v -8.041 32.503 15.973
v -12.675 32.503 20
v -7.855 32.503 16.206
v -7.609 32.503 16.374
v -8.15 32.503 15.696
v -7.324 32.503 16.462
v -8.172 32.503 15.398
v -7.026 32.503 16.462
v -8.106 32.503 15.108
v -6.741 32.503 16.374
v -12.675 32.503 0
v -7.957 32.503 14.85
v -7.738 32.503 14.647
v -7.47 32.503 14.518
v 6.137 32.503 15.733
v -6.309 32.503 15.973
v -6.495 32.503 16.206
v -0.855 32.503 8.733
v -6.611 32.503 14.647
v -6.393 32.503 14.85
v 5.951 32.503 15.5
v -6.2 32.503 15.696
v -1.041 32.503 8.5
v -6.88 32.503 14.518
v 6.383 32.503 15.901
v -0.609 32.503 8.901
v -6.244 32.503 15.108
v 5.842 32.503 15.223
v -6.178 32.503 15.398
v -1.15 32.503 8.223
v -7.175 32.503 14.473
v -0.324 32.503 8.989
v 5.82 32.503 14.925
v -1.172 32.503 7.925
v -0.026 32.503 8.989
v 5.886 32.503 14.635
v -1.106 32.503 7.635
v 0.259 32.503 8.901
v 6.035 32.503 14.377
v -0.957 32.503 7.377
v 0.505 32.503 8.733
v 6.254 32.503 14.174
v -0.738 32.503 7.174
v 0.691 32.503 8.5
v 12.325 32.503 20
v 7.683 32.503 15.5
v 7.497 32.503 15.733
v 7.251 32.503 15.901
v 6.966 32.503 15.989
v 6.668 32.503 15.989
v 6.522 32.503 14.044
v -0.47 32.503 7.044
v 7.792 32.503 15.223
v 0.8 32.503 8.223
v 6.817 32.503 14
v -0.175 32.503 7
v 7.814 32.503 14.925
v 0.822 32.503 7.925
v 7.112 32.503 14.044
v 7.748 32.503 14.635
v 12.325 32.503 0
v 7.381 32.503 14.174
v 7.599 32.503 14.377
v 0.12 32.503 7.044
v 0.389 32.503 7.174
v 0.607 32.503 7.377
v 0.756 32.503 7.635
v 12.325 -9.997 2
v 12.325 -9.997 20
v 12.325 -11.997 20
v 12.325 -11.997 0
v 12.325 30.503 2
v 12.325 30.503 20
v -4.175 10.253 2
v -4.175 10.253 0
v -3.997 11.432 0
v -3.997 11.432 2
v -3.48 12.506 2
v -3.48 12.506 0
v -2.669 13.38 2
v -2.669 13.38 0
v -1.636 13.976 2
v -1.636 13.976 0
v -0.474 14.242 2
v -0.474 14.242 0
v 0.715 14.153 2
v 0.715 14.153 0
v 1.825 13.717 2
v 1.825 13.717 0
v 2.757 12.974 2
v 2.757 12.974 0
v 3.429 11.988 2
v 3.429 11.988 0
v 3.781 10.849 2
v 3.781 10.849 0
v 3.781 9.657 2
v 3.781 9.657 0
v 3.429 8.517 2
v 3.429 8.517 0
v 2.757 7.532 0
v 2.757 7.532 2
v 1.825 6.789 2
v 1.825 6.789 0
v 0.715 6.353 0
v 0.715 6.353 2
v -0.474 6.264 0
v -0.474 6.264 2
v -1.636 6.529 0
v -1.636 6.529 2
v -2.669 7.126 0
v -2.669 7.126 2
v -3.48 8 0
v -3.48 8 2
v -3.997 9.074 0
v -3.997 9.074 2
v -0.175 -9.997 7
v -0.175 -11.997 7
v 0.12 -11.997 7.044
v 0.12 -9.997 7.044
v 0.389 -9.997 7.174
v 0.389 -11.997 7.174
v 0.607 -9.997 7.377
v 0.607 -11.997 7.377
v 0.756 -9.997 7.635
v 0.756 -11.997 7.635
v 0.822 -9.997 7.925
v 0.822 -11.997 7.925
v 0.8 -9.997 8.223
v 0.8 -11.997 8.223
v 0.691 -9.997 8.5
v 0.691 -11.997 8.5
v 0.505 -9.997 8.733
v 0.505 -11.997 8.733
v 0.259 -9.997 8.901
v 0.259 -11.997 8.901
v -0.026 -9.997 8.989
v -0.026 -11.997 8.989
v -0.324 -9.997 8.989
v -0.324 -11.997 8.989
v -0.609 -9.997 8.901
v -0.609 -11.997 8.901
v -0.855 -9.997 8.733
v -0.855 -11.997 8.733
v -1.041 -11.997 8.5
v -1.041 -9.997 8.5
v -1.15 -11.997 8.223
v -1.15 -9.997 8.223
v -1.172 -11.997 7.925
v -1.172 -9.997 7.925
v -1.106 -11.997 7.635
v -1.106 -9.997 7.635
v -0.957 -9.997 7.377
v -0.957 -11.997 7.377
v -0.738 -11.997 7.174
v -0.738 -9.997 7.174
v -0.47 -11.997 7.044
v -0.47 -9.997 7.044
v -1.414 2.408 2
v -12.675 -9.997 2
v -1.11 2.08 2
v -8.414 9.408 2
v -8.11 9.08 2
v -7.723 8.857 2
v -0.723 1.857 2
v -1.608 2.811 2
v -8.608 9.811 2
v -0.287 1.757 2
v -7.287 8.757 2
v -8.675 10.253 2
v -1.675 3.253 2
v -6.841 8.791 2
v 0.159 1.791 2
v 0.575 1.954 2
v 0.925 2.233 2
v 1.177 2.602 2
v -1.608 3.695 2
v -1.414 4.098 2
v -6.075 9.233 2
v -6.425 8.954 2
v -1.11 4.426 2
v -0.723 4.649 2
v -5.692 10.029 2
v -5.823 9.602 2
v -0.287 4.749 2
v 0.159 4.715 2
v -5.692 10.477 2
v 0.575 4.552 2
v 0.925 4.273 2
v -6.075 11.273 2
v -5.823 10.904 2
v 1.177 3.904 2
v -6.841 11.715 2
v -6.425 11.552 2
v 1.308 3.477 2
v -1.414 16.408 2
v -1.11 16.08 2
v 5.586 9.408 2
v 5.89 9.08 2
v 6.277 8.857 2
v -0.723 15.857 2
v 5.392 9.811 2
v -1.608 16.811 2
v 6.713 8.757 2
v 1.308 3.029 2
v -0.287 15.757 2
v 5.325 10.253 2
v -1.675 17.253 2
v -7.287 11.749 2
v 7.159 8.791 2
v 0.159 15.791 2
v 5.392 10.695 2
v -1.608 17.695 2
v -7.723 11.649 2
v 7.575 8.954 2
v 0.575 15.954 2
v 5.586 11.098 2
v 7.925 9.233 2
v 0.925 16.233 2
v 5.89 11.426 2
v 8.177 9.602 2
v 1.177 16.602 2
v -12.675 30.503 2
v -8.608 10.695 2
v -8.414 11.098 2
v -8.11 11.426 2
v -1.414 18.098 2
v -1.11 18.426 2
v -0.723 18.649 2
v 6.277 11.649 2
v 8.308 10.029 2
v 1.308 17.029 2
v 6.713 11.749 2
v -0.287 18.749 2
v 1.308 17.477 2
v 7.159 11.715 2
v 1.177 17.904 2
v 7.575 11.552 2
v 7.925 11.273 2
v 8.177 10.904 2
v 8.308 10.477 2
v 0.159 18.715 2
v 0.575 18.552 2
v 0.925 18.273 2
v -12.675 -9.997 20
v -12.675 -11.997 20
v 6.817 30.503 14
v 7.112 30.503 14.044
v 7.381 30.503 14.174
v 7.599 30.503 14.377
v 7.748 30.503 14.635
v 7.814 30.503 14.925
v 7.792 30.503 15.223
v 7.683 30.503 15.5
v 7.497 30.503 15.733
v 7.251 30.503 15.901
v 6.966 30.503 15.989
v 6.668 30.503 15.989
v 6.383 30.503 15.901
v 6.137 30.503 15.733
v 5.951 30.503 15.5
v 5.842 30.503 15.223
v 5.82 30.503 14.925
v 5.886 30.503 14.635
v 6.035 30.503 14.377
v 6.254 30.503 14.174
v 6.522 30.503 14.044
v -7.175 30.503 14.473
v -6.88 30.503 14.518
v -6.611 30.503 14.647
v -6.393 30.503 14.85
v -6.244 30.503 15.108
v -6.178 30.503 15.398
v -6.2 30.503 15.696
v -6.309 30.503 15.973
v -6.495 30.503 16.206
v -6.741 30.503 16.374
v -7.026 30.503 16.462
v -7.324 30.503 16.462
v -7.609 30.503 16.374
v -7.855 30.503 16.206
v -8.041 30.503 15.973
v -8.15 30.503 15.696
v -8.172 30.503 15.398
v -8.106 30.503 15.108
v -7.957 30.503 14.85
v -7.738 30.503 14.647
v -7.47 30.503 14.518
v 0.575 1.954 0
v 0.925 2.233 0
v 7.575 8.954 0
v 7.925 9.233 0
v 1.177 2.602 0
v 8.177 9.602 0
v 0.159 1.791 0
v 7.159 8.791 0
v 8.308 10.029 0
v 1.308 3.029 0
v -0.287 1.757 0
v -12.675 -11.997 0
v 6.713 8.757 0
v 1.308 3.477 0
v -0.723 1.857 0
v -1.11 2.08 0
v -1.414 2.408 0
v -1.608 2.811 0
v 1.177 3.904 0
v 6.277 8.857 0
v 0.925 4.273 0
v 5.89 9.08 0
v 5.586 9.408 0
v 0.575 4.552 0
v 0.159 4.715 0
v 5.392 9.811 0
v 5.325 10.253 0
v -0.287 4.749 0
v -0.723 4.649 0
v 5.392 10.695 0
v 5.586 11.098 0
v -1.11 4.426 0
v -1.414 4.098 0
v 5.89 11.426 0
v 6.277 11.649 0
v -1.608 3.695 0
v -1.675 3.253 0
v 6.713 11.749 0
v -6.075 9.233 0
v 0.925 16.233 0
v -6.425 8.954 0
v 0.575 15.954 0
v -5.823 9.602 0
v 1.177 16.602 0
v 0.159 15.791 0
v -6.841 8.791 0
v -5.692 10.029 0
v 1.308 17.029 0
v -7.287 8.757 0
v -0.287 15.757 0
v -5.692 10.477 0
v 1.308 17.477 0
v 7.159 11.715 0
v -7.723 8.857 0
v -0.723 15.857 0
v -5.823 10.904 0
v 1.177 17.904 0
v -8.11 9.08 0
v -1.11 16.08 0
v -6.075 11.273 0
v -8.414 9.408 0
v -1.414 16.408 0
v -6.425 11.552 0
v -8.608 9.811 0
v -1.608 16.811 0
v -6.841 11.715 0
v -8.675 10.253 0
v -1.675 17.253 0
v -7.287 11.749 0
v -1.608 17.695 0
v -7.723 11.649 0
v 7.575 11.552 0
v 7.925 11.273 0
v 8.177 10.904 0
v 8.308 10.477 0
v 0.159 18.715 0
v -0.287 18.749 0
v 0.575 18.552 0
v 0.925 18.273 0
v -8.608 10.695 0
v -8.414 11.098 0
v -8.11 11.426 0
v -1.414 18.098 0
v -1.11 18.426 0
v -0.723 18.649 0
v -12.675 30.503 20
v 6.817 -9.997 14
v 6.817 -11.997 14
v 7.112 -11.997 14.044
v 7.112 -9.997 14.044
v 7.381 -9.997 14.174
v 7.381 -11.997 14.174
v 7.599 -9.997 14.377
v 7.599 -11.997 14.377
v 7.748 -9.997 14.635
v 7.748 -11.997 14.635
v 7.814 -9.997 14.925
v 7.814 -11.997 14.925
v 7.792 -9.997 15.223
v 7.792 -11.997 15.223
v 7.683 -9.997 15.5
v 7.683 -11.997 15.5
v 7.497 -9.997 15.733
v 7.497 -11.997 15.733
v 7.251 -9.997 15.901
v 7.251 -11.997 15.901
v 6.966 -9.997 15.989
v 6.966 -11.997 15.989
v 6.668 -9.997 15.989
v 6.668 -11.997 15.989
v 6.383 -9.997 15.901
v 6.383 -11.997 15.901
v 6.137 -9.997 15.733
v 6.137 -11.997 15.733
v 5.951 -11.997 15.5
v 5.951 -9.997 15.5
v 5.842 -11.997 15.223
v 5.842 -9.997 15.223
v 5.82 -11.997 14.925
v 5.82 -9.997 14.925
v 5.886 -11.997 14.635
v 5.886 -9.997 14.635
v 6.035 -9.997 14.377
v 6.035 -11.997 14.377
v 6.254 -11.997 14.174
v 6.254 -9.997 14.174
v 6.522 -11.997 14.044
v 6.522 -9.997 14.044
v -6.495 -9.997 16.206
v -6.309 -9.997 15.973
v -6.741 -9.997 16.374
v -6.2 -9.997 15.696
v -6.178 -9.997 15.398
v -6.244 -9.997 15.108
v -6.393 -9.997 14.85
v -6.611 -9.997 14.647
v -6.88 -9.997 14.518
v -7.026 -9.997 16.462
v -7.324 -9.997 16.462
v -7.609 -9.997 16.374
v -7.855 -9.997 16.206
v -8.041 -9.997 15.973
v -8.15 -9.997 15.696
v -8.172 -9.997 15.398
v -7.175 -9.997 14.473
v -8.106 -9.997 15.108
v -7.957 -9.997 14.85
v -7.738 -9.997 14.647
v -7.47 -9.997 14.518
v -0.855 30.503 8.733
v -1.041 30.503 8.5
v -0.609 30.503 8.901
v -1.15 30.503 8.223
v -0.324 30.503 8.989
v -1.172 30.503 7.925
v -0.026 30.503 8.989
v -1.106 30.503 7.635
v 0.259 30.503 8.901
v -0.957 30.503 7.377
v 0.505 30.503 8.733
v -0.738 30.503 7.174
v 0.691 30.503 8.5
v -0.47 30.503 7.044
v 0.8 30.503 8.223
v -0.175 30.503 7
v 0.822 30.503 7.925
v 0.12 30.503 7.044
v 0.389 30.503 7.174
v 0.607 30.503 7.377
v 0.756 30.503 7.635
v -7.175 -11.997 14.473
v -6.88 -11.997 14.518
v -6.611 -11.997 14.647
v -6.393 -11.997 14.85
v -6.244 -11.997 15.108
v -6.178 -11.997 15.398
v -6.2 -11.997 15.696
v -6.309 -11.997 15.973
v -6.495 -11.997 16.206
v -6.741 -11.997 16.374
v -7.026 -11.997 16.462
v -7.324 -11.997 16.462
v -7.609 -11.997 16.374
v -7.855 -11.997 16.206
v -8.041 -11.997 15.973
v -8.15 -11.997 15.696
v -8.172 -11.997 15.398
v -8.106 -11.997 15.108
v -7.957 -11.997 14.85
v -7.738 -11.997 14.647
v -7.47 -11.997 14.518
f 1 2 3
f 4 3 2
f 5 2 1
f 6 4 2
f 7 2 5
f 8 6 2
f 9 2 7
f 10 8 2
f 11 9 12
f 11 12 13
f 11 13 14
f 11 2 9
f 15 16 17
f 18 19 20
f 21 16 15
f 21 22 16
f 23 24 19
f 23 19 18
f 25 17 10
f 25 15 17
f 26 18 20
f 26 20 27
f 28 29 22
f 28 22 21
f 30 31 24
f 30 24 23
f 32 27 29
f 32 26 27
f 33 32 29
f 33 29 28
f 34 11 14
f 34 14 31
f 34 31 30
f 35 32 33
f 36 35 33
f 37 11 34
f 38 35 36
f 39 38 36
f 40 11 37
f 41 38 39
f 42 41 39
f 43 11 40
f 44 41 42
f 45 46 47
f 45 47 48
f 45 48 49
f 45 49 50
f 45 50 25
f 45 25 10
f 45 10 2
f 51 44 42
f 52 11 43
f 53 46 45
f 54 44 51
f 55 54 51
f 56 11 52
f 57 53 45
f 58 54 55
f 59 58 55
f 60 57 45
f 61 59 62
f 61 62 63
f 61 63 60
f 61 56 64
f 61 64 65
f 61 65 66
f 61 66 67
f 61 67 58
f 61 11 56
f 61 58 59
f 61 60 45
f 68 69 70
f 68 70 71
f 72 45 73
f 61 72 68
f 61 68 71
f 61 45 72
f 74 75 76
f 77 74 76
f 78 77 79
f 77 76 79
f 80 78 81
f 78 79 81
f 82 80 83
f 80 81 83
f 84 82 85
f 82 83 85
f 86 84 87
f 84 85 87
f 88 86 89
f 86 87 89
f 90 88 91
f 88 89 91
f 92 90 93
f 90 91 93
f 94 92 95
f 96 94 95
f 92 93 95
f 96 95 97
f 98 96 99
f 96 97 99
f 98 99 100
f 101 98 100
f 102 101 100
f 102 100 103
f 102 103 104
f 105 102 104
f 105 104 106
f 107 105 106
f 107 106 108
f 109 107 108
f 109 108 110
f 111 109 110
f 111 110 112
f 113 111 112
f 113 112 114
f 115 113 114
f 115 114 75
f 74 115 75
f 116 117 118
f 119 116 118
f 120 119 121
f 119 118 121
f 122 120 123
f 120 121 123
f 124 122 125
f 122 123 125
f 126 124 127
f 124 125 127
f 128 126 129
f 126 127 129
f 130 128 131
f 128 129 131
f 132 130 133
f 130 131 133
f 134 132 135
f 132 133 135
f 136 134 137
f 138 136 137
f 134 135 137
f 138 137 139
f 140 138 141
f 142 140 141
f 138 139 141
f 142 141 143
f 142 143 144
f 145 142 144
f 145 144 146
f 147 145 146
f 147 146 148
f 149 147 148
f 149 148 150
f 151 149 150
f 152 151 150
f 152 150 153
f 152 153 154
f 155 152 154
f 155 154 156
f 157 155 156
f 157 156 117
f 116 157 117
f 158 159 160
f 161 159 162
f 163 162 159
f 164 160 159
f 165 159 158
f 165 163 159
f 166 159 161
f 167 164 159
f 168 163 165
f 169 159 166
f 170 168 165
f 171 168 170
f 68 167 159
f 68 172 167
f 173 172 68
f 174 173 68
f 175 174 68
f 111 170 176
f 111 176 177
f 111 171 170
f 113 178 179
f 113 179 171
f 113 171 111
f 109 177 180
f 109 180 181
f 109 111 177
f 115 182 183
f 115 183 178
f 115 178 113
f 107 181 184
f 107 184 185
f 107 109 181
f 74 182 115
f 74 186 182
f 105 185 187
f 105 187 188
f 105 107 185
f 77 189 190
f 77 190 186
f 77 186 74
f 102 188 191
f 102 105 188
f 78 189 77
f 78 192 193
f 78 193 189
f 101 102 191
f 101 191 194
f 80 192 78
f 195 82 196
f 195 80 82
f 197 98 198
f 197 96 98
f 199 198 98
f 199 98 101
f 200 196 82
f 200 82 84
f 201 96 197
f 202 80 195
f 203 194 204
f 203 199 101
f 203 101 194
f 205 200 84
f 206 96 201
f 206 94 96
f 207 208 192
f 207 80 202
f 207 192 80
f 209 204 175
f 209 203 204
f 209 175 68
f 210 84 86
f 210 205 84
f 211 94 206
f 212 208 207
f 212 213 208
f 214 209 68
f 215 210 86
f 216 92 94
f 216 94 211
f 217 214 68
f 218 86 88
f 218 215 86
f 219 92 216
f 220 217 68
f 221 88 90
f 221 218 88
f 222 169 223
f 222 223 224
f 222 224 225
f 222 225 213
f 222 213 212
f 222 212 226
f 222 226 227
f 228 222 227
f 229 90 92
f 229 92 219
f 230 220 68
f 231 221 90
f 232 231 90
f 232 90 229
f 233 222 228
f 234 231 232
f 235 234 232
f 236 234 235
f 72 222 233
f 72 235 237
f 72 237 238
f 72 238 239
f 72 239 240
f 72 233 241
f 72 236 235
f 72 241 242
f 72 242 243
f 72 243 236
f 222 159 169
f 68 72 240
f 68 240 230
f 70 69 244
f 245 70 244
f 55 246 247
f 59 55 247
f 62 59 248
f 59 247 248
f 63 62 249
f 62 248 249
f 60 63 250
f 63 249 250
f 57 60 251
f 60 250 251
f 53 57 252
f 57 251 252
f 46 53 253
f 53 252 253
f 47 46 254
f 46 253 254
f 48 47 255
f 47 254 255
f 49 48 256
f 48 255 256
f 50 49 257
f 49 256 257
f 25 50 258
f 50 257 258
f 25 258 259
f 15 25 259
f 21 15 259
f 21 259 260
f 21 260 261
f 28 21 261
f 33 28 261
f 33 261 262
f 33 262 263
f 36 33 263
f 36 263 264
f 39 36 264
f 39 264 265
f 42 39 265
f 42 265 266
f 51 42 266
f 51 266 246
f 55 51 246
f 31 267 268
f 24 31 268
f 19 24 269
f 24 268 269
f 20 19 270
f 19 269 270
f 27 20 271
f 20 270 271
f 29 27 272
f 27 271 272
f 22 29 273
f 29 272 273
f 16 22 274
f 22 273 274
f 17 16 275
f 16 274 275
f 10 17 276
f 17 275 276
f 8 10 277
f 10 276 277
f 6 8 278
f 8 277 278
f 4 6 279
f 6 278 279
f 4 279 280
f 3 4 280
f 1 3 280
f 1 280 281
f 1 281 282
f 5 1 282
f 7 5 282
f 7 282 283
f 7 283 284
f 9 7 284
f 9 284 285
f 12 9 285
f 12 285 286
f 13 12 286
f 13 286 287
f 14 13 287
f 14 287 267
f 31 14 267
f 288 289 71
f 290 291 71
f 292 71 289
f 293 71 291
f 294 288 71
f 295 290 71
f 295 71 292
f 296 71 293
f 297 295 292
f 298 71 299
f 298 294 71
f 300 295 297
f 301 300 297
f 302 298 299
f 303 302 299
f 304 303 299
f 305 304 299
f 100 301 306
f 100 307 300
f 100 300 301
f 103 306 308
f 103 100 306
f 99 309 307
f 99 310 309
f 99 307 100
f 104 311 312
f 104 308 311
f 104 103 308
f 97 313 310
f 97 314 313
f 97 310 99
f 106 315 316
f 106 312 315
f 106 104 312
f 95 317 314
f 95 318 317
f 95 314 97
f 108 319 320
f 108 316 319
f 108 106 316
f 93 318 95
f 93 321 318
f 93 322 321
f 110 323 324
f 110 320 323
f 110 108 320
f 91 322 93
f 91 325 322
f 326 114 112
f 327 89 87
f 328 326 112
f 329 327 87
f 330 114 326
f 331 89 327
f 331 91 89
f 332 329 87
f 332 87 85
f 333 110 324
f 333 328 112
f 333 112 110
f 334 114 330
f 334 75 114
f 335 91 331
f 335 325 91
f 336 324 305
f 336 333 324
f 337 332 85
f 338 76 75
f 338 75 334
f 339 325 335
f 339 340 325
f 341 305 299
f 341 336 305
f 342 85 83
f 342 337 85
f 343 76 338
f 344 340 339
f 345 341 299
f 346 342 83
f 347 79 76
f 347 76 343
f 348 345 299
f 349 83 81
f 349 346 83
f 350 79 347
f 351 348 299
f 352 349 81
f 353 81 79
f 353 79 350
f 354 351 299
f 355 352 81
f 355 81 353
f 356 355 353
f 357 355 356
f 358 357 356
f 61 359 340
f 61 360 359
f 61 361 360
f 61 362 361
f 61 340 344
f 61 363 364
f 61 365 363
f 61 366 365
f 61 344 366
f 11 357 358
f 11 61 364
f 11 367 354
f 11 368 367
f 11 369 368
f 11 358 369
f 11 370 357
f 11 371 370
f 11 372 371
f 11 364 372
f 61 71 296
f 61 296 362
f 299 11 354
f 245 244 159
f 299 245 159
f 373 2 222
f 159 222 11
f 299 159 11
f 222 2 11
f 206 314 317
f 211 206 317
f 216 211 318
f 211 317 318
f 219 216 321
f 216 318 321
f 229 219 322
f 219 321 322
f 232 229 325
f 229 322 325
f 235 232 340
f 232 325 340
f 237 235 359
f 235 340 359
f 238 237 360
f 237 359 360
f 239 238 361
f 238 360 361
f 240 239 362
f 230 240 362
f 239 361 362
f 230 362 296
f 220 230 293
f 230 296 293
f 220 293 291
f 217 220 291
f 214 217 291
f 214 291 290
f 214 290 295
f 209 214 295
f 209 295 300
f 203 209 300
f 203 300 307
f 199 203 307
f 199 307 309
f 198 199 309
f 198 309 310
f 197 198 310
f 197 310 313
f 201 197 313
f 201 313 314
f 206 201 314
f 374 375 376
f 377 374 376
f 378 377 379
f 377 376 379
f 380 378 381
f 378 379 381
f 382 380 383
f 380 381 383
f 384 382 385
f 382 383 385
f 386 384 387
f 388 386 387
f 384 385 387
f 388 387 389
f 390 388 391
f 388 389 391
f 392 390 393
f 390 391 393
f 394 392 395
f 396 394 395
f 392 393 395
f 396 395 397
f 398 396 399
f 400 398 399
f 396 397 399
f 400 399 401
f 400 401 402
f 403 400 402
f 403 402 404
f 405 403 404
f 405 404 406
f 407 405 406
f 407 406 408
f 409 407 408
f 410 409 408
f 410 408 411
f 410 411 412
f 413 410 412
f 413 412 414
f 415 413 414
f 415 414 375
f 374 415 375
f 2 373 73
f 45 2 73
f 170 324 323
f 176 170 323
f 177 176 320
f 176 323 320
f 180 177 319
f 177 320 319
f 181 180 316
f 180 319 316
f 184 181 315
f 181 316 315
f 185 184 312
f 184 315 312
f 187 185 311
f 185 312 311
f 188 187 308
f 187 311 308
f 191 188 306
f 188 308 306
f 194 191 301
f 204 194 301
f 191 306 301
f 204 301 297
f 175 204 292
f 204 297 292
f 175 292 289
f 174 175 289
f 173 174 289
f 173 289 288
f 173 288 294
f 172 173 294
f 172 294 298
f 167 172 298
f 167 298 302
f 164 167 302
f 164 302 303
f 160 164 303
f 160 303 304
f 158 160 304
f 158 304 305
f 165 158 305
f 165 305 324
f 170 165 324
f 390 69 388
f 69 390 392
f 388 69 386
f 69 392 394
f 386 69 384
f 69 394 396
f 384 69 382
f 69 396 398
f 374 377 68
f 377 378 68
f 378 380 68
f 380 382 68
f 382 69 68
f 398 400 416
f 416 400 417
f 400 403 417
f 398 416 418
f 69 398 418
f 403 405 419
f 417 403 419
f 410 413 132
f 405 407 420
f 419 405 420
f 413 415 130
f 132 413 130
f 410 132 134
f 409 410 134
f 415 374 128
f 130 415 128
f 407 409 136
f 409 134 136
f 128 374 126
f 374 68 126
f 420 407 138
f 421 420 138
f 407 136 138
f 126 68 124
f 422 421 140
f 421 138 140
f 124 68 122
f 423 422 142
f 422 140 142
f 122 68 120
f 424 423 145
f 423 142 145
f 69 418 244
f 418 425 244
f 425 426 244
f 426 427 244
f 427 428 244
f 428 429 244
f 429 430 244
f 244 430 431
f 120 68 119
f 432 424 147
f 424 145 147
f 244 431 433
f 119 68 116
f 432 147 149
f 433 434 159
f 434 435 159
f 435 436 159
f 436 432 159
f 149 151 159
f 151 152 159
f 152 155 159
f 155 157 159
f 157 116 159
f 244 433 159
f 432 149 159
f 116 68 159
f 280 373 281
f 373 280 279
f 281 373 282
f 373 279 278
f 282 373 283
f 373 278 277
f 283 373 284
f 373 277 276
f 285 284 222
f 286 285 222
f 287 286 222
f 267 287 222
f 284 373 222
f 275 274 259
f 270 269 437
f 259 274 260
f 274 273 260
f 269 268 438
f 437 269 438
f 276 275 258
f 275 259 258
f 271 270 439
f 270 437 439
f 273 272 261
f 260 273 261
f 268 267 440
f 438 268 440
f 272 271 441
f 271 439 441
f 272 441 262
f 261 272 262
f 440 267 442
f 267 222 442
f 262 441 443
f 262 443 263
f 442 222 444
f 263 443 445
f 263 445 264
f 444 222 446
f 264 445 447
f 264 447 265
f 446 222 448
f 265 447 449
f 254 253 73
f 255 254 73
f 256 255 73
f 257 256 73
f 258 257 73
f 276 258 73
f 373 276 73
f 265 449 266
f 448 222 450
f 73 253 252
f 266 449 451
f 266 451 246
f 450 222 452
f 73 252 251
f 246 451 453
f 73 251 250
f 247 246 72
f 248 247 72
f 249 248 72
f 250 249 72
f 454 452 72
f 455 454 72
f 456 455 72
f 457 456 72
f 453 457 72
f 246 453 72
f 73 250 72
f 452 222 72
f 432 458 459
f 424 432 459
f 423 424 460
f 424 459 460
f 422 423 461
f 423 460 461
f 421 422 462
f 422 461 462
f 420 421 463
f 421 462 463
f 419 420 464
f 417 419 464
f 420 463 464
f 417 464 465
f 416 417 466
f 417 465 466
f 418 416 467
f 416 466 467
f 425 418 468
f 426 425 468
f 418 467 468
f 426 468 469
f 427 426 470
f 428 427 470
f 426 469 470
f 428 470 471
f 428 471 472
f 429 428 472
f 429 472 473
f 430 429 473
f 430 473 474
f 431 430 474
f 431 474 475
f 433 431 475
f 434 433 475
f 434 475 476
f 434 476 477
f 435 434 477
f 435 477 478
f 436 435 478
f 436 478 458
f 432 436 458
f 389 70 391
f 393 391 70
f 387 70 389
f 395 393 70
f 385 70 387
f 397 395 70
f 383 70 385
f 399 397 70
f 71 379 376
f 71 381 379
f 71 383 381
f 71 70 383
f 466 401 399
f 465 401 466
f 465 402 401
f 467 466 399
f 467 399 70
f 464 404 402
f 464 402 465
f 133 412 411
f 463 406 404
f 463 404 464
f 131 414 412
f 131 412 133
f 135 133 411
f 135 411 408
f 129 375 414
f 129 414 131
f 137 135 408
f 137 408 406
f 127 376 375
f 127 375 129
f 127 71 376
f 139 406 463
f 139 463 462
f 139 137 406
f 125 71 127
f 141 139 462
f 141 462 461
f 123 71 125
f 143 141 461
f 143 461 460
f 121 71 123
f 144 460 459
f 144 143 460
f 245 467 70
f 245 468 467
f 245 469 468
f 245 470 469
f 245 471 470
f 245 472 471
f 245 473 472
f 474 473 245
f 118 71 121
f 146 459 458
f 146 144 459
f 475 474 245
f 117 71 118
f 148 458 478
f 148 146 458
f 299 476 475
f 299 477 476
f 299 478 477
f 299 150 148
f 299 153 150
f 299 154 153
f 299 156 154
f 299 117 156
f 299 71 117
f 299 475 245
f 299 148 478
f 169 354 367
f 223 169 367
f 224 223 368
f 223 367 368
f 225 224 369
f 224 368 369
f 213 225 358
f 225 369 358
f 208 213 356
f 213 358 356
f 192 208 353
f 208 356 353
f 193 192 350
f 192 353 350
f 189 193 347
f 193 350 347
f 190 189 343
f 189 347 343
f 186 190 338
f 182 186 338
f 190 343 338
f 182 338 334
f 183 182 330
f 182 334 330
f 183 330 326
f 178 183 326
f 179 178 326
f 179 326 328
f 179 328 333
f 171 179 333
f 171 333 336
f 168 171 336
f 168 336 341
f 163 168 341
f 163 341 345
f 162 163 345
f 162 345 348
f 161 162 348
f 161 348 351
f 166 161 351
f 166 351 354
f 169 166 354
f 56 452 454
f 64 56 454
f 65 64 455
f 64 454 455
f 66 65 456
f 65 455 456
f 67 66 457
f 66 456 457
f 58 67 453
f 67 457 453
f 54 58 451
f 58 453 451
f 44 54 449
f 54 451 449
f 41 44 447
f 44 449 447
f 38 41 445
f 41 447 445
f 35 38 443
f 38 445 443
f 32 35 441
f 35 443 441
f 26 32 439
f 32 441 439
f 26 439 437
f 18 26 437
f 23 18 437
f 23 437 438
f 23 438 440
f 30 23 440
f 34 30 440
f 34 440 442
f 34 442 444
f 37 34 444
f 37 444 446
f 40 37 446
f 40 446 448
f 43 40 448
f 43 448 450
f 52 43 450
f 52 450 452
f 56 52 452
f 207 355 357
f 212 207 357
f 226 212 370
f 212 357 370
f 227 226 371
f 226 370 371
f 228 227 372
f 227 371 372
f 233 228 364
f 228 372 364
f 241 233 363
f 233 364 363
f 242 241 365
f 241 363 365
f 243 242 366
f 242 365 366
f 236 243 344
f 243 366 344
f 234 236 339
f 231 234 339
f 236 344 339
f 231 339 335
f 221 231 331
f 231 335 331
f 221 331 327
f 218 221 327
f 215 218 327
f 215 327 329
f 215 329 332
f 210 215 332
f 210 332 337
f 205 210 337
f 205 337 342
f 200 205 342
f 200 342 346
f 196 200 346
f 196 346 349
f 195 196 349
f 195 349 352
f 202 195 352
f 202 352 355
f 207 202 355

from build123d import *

# Parameters (mm, degrees)
SKETCH1_W           = 25
SKETCH1_H           = 40.5
BOSS_EXTRUDE1_DEPTH = 2
SKETCH2_W           = 25
SKETCH2_H           = 20
BOSS_EXTRUDE2_DEPTH = 2
SKETCH3_W           = 25
SKETCH3_H           = 20
BOSS_EXTRUDE3_DEPTH = 2
SKETCH5_R           = 4
CUT_EXTRUDE2_DEPTH  = 21
SKETCH6_R           = 1.5
CUT_EXTRUDE3_DEPTH  = 21
SKETCH7_R           = 1
CUT_EXTRUDE4_DEPTH  = 55


with BuildPart() as part:
    # Sketch1 → Boss-Extrude1 (new body)
    with BuildSketch(Plane.XY):
        with Locations((-0.174770451, 10.252942624)):
            Rectangle(SKETCH1_W, SKETCH1_H)
    extrude(amount=BOSS_EXTRUDE1_DEPTH)

    # Sketch2 → Boss-Extrude2 (add)
    with BuildSketch(Plane(origin=(0, 30.502942624, 0), x_dir=(1, 0, 0), z_dir=(0, 1, 0))):
        with Locations((-0.174770451, -10)):
            Rectangle(SKETCH2_W, SKETCH2_H)
    extrude(amount=BOSS_EXTRUDE2_DEPTH)

    # Sketch3 → Boss-Extrude3 (add)
    with BuildSketch(Plane(origin=(0, -9.997057376, 0), x_dir=(-1, 0, 0), z_dir=(0, -1, 0))):
        with Locations((0.174770451, -10)):
            Rectangle(SKETCH3_W, SKETCH3_H)
    extrude(amount=BOSS_EXTRUDE3_DEPTH)

    # Sketch5 → Cut-Extrude2 (cut)
    with BuildSketch(Plane(origin=(0, 0, 0), x_dir=(-1, 0, 0), z_dir=(0, 0, -1))):
        with Locations((0.174770451, 10.252942624)):
            Circle(SKETCH5_R)
    extrude(amount=-CUT_EXTRUDE2_DEPTH, mode=Mode.SUBTRACT)

    # Sketch6 → Cut-Extrude3 (cut)
    with BuildSketch(Plane(origin=(0, 0, 0), x_dir=(-1, 0, 0), z_dir=(0, 0, -1))):
        with Locations((7.174770451, 10.252942624)):
            Circle(SKETCH6_R)
        with Locations((0.174770451, 3.252942624)):
            Circle(SKETCH6_R)
        with Locations((-6.825229549, 10.252942624)):
            Circle(SKETCH6_R)
        with Locations((0.174770451, 17.252942624)):
            Circle(SKETCH6_R)
    extrude(amount=-CUT_EXTRUDE3_DEPTH, mode=Mode.SUBTRACT)

    # Sketch7 → Cut-Extrude4 (cut)
    with BuildSketch(Plane(origin=(0, -11.997057376, 0), x_dir=(-1, 0, 0), z_dir=(0, -1, 0))):
        with Locations(Location((7.174770451, -15.473202344, 0), (0, 0, 90))):
            Circle(SKETCH7_R)
        with Locations(Location((-6.817230105, -15, 0), (0, 0, 90))):
            Circle(SKETCH7_R)
        with Locations(Location((0.174770451, -8, 0), (0, 0, 90))):
            Circle(SKETCH7_R)
    extrude(amount=-CUT_EXTRUDE4_DEPTH, mode=Mode.SUBTRACT)


solid = part.part
